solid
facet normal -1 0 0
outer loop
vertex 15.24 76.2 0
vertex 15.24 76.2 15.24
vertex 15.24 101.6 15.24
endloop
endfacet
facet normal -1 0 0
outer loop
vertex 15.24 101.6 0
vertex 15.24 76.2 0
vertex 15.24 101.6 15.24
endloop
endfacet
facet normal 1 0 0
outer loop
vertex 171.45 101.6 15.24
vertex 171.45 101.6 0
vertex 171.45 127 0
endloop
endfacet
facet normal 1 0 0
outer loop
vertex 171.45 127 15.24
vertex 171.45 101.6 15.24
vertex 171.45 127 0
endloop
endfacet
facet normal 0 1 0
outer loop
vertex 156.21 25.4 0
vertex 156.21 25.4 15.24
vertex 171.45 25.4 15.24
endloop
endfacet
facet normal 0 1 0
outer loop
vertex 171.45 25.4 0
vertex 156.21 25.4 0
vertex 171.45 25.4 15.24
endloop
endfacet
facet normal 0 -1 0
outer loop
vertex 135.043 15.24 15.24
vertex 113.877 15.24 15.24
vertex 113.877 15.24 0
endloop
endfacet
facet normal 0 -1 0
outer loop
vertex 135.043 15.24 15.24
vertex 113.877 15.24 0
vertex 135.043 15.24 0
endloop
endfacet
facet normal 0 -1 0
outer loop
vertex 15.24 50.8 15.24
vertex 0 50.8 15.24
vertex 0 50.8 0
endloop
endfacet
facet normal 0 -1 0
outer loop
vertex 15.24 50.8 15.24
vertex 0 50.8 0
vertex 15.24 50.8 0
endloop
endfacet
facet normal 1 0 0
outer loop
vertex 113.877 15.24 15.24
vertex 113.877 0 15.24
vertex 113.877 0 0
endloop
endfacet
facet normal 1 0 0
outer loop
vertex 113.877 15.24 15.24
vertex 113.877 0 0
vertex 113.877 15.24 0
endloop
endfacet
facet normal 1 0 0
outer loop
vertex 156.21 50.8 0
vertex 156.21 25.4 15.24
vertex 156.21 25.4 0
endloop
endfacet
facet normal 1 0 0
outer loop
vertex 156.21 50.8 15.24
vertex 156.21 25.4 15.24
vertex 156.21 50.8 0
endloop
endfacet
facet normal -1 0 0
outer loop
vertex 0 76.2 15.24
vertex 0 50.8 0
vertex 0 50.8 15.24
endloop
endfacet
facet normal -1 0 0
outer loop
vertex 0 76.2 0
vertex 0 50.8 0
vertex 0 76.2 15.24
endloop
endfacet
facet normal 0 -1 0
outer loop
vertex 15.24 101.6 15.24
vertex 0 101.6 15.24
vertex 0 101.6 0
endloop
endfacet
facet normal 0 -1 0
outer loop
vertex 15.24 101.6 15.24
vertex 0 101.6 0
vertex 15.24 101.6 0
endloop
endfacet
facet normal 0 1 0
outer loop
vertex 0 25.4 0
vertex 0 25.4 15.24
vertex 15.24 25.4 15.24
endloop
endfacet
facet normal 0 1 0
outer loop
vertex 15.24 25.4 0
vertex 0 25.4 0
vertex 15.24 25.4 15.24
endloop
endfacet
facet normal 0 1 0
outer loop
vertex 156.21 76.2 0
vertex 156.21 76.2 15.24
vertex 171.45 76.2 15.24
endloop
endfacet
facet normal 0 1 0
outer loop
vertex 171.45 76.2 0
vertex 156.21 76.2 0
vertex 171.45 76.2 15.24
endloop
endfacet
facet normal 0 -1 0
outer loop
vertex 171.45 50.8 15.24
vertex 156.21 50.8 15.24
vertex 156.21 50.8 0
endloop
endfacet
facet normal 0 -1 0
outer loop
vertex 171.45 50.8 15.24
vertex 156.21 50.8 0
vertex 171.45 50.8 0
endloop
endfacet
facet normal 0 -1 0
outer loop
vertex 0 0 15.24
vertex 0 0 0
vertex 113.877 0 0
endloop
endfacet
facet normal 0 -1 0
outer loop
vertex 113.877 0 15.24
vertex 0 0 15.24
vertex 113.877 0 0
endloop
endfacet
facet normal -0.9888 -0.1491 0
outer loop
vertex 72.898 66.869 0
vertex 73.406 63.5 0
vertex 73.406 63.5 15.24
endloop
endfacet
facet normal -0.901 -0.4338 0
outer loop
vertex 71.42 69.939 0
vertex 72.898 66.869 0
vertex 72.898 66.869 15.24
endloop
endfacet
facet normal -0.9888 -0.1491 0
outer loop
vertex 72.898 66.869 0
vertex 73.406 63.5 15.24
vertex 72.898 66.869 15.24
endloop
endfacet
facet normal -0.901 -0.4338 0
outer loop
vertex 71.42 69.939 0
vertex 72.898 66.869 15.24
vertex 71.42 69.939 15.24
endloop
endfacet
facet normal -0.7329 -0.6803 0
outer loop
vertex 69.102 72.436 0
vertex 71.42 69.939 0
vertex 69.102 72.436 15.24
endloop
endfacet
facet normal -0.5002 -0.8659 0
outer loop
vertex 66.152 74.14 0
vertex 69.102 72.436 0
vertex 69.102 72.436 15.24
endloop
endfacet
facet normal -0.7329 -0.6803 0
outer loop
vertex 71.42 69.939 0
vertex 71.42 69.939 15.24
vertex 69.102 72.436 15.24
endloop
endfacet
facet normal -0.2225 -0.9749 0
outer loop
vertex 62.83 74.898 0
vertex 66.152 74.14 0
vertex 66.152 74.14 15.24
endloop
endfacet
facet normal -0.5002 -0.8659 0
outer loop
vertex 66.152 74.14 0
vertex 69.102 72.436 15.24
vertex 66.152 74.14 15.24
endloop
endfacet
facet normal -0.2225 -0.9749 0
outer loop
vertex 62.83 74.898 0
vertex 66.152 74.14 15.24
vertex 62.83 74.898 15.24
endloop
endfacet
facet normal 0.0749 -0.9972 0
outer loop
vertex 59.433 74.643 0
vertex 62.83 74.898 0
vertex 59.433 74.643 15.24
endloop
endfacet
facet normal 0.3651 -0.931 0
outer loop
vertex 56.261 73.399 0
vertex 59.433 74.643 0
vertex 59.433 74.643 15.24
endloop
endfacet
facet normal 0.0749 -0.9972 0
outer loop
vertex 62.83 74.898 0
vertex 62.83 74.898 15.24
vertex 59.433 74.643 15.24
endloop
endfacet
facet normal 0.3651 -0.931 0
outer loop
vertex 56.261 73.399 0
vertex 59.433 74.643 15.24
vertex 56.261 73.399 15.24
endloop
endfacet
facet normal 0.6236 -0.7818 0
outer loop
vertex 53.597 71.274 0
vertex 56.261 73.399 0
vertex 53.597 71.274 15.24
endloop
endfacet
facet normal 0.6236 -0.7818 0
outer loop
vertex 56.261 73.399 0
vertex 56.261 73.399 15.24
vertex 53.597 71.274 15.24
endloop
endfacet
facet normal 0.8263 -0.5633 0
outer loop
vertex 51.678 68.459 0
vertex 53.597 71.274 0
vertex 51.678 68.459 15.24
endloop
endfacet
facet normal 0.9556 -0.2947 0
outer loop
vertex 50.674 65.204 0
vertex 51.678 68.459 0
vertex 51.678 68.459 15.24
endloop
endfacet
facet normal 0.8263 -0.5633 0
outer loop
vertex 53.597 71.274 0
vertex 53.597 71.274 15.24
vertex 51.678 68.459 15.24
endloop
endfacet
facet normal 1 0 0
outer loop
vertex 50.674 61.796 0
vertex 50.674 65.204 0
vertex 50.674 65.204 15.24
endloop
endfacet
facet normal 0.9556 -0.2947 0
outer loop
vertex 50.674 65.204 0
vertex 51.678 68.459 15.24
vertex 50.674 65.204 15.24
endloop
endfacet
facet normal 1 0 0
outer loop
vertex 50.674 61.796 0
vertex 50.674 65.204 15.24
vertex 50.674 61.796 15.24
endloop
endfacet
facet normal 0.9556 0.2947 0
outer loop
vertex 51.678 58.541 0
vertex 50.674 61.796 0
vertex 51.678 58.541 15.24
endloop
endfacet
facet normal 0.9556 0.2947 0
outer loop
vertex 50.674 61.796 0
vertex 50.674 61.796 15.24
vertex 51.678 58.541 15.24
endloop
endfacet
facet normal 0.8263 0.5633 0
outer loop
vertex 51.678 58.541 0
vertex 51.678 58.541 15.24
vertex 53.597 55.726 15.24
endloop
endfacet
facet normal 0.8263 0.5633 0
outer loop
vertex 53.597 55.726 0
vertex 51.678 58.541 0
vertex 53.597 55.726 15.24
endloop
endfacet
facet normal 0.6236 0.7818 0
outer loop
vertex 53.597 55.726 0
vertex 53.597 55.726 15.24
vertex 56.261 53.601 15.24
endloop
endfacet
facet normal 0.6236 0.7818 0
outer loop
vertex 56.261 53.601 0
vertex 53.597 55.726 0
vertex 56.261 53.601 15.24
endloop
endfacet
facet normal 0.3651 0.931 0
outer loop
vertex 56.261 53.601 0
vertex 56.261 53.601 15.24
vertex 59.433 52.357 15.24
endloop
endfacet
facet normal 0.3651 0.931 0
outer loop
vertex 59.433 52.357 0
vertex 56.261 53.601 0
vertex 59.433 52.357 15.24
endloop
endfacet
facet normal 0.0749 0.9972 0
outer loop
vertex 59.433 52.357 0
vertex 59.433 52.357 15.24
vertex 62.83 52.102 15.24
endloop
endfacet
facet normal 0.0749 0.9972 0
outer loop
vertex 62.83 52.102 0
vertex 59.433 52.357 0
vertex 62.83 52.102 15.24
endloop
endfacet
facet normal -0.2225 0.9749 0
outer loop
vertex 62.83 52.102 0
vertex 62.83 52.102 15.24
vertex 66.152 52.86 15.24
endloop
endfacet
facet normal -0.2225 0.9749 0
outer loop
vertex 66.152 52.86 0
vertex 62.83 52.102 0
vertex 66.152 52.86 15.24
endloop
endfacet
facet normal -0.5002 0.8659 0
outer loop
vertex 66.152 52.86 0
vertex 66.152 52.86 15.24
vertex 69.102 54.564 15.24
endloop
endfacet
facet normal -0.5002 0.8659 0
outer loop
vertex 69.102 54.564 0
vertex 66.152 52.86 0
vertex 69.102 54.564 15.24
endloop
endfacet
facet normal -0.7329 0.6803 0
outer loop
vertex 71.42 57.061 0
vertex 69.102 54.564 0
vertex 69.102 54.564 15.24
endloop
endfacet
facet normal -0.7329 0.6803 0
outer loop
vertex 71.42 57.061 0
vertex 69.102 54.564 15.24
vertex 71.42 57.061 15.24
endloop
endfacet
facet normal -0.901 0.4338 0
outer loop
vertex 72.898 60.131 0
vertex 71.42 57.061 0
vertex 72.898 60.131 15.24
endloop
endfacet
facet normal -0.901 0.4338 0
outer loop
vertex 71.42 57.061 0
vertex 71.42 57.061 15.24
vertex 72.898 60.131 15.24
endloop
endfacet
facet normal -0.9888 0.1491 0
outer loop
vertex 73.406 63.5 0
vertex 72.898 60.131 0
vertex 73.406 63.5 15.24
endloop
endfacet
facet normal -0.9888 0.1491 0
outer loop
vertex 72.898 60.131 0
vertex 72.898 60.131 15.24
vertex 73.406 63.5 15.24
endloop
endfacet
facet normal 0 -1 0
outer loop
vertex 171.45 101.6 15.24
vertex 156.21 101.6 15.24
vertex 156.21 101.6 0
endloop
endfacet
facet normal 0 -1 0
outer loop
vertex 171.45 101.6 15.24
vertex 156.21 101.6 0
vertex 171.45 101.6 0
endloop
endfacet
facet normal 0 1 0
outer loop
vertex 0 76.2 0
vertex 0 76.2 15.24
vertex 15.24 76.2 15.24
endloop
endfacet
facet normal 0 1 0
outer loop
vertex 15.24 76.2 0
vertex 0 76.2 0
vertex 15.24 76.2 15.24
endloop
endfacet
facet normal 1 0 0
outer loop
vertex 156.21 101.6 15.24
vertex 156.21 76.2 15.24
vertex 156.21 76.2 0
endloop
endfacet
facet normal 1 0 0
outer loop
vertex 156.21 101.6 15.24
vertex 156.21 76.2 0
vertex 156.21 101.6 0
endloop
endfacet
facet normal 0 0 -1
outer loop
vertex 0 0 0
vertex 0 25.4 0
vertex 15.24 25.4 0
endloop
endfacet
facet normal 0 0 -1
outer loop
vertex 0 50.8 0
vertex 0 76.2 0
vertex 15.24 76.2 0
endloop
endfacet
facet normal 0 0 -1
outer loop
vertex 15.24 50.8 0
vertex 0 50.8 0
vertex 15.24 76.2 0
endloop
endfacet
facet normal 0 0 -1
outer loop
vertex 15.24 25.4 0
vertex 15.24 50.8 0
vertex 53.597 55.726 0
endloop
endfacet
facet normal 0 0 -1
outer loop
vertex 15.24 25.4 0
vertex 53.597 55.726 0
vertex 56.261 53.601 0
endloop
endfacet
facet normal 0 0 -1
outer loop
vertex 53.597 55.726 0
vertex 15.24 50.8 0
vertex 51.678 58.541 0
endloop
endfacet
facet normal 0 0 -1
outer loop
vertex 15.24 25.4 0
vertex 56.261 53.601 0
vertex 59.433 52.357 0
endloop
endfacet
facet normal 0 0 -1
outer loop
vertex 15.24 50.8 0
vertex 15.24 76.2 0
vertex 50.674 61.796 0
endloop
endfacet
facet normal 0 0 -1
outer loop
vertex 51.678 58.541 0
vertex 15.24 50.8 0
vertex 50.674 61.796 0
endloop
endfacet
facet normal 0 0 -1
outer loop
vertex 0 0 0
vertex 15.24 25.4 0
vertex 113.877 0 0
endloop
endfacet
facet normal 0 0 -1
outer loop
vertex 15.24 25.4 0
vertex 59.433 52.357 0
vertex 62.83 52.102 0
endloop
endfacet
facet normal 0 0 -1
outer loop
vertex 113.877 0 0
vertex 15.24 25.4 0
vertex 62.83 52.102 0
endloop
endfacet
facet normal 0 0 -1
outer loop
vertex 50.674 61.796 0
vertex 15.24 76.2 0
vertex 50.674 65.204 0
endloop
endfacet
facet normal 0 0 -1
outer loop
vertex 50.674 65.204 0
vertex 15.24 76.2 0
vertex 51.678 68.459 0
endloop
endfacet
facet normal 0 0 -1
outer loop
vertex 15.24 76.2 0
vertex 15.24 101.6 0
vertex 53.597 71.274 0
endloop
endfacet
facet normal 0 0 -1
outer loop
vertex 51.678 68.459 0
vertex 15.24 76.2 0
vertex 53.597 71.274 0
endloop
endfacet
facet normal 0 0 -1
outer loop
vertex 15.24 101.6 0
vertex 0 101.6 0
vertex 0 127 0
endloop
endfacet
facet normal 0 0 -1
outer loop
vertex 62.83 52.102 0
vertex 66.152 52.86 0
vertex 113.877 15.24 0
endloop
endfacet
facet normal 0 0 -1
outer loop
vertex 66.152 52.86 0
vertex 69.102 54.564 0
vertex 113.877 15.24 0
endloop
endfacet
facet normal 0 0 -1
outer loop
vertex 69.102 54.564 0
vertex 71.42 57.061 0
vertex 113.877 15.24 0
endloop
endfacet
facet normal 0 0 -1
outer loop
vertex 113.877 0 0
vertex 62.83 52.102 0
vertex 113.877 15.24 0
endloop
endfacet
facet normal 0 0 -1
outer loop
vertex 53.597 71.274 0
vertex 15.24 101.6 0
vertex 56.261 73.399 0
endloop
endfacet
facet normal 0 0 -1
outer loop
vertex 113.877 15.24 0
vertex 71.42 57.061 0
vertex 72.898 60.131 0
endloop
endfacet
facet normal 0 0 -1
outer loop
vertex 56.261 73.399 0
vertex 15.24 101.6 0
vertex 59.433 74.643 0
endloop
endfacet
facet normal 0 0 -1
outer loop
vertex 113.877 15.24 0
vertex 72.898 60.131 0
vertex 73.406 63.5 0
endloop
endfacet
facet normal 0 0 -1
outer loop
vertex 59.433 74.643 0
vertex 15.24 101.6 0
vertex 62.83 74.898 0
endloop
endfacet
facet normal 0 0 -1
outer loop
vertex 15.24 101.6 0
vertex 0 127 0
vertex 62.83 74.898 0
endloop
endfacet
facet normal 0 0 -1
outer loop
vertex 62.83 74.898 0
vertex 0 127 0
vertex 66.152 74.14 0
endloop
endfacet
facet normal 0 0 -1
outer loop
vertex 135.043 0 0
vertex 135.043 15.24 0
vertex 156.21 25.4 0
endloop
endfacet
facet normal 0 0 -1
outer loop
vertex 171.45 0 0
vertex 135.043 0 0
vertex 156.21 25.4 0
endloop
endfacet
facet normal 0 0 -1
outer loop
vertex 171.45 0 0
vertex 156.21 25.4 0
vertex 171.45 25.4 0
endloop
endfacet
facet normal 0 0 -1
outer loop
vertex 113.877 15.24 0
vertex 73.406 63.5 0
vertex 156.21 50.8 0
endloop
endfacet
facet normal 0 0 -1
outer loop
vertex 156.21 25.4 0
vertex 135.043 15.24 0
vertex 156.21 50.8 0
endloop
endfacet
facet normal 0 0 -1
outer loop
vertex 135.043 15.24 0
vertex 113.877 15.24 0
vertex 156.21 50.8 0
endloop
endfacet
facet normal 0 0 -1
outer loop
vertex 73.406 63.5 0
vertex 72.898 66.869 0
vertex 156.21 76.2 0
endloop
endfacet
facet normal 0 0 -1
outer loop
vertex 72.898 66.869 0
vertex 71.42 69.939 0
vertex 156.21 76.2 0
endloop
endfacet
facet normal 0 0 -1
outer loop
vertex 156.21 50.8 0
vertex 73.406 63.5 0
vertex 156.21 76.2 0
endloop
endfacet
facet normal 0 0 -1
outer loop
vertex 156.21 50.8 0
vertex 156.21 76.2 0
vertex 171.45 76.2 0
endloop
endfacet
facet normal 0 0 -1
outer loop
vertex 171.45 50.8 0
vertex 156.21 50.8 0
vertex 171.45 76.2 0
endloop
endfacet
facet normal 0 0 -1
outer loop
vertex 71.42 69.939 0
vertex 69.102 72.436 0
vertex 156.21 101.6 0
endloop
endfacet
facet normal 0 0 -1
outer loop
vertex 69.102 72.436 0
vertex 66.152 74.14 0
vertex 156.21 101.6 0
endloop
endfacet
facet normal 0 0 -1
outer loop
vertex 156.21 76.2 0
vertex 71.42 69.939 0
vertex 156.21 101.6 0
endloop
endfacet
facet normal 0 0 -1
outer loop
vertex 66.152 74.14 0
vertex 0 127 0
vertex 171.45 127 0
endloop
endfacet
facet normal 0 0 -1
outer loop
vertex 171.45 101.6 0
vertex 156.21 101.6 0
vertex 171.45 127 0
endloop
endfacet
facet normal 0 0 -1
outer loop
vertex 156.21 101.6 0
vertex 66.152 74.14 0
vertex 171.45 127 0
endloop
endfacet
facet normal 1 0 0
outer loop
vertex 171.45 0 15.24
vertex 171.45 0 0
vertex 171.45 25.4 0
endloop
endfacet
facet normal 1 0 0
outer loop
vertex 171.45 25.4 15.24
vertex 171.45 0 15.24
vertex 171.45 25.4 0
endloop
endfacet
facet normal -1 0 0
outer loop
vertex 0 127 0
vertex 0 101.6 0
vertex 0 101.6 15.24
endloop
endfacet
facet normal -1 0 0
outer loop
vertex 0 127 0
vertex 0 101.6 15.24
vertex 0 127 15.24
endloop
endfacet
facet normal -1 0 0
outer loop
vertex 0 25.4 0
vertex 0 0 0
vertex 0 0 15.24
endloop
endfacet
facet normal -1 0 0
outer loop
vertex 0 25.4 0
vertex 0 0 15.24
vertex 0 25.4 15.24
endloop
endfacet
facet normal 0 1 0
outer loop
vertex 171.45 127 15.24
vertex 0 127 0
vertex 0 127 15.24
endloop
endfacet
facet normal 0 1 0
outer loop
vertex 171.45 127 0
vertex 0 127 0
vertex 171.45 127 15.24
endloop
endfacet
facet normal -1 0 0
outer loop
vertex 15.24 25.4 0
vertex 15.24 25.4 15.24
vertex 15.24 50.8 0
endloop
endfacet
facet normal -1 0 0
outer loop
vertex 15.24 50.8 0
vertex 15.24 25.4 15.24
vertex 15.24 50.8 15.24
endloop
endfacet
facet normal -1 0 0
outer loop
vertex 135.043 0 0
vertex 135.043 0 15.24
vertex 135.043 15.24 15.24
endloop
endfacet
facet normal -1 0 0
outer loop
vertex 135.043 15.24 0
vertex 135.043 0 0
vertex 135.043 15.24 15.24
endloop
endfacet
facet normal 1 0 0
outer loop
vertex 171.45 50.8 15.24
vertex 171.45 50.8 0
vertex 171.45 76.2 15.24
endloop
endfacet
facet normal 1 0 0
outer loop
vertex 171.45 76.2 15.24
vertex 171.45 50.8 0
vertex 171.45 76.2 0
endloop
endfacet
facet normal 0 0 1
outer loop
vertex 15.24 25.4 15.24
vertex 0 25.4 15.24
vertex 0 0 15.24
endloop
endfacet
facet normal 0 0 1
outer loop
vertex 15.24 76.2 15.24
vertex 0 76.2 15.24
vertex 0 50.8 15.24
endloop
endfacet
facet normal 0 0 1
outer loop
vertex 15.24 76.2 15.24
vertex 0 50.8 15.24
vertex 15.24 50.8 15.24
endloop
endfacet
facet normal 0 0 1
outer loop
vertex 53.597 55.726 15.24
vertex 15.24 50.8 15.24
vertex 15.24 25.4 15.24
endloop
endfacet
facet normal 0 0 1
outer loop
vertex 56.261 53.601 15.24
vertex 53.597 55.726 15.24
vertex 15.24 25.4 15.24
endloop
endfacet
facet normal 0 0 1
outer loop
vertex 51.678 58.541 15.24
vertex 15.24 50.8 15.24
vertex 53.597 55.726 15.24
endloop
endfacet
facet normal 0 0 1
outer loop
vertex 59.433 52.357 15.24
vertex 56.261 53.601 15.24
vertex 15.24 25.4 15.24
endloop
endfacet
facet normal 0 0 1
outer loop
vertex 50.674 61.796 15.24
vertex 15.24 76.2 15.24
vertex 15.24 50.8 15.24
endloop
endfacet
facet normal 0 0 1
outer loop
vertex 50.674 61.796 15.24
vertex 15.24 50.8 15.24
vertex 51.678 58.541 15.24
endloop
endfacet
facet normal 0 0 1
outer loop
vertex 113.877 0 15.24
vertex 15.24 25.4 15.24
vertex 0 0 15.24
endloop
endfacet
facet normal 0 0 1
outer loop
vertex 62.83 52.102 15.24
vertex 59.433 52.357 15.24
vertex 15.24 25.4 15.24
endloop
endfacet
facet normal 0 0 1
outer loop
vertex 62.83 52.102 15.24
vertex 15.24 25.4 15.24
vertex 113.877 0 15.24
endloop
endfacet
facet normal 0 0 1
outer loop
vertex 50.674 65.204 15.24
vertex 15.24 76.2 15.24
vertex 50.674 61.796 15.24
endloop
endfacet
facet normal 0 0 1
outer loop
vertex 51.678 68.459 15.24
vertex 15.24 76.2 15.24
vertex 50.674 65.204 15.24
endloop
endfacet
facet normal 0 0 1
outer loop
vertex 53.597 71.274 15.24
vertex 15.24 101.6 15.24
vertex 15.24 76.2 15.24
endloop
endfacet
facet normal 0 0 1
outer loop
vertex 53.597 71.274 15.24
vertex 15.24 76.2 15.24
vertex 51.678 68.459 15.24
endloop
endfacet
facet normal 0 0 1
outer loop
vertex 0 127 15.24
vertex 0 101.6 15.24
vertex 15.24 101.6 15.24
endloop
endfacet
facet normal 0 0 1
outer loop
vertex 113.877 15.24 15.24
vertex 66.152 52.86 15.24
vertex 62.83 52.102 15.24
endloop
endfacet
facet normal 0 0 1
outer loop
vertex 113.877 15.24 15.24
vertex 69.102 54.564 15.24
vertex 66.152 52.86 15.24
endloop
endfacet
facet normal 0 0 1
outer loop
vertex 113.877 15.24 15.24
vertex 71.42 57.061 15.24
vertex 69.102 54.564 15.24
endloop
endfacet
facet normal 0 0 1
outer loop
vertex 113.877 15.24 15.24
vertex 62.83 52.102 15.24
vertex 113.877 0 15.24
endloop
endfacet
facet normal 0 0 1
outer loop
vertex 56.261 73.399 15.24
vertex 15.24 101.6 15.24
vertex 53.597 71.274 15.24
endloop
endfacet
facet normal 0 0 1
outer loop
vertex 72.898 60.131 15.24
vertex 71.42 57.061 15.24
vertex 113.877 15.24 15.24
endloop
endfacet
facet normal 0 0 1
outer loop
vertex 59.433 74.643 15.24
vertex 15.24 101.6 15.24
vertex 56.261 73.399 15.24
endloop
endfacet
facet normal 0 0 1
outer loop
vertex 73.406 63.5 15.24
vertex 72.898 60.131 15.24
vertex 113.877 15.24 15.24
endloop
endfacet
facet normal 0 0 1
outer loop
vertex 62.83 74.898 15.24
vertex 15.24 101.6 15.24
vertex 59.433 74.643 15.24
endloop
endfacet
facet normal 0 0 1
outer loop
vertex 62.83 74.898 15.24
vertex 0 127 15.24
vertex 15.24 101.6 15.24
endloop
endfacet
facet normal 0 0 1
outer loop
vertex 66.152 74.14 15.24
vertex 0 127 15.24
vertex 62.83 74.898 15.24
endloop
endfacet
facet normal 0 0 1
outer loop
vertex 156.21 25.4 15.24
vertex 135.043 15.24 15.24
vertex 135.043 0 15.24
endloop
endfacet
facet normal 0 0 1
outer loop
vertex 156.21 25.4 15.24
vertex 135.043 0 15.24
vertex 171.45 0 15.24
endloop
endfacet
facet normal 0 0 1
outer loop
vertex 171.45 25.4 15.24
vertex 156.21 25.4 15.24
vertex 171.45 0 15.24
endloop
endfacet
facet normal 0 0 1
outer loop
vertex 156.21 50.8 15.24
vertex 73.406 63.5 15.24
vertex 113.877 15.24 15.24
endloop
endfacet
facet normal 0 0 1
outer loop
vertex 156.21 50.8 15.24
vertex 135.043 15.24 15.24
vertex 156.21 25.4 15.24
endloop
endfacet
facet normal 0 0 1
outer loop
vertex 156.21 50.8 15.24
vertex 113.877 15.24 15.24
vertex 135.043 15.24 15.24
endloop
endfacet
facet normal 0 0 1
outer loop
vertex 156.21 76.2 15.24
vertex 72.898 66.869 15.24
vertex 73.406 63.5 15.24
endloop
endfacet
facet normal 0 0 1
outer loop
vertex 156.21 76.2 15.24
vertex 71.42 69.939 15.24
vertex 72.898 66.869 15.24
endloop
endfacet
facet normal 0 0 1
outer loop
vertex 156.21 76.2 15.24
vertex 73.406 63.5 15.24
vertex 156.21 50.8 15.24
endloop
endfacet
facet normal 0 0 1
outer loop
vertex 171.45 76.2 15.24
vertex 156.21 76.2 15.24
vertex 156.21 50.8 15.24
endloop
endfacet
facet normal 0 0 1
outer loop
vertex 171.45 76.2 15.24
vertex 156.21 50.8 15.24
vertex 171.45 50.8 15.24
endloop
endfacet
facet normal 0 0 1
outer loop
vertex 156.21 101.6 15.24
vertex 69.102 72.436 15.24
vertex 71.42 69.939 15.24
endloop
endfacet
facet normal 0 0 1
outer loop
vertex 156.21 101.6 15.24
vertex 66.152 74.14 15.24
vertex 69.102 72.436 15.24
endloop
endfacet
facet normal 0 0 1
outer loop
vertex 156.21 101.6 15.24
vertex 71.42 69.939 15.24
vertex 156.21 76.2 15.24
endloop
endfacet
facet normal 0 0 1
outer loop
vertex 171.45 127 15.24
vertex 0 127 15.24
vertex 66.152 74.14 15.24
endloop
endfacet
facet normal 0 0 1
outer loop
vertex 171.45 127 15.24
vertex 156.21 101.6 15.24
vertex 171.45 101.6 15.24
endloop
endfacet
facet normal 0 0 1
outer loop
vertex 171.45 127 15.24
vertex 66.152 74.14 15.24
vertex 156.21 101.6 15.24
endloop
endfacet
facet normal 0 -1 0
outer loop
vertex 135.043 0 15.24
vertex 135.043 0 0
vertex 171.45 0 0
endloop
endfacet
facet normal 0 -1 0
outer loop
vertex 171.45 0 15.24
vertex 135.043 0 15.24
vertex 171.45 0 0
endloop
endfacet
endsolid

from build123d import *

# Parameters (mm, degrees)
SKETCH1_W           = 171.45
SKETCH1_H           = 127
BOSS_EXTRUDE1_DEPTH = 15.24
SKETCH5_W           = 15.24
SKETCH5_H           = 25.4
CUT_EXTRUDE1_DEPTH  = 15.24
SKETCH11_R          = 11.43
CUT_EXTRUDE3_DEPTH  = 15.24
SKETCH7_W           = 21.166666666
SKETCH7_H           = 15.24
CUT_EXTRUDE4_DEPTH  = 15.24


with BuildPart() as part:
    # Sketch1 → Boss-Extrude1 (new body)
    with BuildSketch(Plane.XY):
        with Locations((85.725, 63.5)):
            Rectangle(SKETCH1_W, SKETCH1_H)
    extrude(amount=BOSS_EXTRUDE1_DEPTH)

    # Sketch5 → Cut-Extrude1 (cut)
    with BuildSketch(Plane.XY.offset(15.24)):
        with Locations((7.62, 88.9)):
            Rectangle(SKETCH5_W, SKETCH5_H)
        with Locations((7.62, 38.1)):
            Rectangle(SKETCH5_W, SKETCH5_H)
        with Locations((163.83, 88.9)):
            Rectangle(SKETCH5_W, SKETCH5_H)
        with Locations((163.83, 38.1)):
            Rectangle(SKETCH5_W, SKETCH5_H)
    extrude(amount=-CUT_EXTRUDE1_DEPTH, mode=Mode.SUBTRACT)

    # Sketch11 → Cut-Extrude3 (cut)
    with BuildSketch(Plane.XY.offset(15.24)):
        with Locations((61.976, 63.5)):
            Circle(SKETCH11_R)
    extrude(amount=-CUT_EXTRUDE3_DEPTH, mode=Mode.SUBTRACT)

    # Sketch7 → Cut-Extrude4 (cut)
    with BuildSketch(Plane.XY.offset(15.24)):
        with Locations((124.46, 7.62)):
            Rectangle(SKETCH7_W, SKETCH7_H)
    extrude(amount=-CUT_EXTRUDE4_DEPTH, mode=Mode.SUBTRACT)


solid = part.part
